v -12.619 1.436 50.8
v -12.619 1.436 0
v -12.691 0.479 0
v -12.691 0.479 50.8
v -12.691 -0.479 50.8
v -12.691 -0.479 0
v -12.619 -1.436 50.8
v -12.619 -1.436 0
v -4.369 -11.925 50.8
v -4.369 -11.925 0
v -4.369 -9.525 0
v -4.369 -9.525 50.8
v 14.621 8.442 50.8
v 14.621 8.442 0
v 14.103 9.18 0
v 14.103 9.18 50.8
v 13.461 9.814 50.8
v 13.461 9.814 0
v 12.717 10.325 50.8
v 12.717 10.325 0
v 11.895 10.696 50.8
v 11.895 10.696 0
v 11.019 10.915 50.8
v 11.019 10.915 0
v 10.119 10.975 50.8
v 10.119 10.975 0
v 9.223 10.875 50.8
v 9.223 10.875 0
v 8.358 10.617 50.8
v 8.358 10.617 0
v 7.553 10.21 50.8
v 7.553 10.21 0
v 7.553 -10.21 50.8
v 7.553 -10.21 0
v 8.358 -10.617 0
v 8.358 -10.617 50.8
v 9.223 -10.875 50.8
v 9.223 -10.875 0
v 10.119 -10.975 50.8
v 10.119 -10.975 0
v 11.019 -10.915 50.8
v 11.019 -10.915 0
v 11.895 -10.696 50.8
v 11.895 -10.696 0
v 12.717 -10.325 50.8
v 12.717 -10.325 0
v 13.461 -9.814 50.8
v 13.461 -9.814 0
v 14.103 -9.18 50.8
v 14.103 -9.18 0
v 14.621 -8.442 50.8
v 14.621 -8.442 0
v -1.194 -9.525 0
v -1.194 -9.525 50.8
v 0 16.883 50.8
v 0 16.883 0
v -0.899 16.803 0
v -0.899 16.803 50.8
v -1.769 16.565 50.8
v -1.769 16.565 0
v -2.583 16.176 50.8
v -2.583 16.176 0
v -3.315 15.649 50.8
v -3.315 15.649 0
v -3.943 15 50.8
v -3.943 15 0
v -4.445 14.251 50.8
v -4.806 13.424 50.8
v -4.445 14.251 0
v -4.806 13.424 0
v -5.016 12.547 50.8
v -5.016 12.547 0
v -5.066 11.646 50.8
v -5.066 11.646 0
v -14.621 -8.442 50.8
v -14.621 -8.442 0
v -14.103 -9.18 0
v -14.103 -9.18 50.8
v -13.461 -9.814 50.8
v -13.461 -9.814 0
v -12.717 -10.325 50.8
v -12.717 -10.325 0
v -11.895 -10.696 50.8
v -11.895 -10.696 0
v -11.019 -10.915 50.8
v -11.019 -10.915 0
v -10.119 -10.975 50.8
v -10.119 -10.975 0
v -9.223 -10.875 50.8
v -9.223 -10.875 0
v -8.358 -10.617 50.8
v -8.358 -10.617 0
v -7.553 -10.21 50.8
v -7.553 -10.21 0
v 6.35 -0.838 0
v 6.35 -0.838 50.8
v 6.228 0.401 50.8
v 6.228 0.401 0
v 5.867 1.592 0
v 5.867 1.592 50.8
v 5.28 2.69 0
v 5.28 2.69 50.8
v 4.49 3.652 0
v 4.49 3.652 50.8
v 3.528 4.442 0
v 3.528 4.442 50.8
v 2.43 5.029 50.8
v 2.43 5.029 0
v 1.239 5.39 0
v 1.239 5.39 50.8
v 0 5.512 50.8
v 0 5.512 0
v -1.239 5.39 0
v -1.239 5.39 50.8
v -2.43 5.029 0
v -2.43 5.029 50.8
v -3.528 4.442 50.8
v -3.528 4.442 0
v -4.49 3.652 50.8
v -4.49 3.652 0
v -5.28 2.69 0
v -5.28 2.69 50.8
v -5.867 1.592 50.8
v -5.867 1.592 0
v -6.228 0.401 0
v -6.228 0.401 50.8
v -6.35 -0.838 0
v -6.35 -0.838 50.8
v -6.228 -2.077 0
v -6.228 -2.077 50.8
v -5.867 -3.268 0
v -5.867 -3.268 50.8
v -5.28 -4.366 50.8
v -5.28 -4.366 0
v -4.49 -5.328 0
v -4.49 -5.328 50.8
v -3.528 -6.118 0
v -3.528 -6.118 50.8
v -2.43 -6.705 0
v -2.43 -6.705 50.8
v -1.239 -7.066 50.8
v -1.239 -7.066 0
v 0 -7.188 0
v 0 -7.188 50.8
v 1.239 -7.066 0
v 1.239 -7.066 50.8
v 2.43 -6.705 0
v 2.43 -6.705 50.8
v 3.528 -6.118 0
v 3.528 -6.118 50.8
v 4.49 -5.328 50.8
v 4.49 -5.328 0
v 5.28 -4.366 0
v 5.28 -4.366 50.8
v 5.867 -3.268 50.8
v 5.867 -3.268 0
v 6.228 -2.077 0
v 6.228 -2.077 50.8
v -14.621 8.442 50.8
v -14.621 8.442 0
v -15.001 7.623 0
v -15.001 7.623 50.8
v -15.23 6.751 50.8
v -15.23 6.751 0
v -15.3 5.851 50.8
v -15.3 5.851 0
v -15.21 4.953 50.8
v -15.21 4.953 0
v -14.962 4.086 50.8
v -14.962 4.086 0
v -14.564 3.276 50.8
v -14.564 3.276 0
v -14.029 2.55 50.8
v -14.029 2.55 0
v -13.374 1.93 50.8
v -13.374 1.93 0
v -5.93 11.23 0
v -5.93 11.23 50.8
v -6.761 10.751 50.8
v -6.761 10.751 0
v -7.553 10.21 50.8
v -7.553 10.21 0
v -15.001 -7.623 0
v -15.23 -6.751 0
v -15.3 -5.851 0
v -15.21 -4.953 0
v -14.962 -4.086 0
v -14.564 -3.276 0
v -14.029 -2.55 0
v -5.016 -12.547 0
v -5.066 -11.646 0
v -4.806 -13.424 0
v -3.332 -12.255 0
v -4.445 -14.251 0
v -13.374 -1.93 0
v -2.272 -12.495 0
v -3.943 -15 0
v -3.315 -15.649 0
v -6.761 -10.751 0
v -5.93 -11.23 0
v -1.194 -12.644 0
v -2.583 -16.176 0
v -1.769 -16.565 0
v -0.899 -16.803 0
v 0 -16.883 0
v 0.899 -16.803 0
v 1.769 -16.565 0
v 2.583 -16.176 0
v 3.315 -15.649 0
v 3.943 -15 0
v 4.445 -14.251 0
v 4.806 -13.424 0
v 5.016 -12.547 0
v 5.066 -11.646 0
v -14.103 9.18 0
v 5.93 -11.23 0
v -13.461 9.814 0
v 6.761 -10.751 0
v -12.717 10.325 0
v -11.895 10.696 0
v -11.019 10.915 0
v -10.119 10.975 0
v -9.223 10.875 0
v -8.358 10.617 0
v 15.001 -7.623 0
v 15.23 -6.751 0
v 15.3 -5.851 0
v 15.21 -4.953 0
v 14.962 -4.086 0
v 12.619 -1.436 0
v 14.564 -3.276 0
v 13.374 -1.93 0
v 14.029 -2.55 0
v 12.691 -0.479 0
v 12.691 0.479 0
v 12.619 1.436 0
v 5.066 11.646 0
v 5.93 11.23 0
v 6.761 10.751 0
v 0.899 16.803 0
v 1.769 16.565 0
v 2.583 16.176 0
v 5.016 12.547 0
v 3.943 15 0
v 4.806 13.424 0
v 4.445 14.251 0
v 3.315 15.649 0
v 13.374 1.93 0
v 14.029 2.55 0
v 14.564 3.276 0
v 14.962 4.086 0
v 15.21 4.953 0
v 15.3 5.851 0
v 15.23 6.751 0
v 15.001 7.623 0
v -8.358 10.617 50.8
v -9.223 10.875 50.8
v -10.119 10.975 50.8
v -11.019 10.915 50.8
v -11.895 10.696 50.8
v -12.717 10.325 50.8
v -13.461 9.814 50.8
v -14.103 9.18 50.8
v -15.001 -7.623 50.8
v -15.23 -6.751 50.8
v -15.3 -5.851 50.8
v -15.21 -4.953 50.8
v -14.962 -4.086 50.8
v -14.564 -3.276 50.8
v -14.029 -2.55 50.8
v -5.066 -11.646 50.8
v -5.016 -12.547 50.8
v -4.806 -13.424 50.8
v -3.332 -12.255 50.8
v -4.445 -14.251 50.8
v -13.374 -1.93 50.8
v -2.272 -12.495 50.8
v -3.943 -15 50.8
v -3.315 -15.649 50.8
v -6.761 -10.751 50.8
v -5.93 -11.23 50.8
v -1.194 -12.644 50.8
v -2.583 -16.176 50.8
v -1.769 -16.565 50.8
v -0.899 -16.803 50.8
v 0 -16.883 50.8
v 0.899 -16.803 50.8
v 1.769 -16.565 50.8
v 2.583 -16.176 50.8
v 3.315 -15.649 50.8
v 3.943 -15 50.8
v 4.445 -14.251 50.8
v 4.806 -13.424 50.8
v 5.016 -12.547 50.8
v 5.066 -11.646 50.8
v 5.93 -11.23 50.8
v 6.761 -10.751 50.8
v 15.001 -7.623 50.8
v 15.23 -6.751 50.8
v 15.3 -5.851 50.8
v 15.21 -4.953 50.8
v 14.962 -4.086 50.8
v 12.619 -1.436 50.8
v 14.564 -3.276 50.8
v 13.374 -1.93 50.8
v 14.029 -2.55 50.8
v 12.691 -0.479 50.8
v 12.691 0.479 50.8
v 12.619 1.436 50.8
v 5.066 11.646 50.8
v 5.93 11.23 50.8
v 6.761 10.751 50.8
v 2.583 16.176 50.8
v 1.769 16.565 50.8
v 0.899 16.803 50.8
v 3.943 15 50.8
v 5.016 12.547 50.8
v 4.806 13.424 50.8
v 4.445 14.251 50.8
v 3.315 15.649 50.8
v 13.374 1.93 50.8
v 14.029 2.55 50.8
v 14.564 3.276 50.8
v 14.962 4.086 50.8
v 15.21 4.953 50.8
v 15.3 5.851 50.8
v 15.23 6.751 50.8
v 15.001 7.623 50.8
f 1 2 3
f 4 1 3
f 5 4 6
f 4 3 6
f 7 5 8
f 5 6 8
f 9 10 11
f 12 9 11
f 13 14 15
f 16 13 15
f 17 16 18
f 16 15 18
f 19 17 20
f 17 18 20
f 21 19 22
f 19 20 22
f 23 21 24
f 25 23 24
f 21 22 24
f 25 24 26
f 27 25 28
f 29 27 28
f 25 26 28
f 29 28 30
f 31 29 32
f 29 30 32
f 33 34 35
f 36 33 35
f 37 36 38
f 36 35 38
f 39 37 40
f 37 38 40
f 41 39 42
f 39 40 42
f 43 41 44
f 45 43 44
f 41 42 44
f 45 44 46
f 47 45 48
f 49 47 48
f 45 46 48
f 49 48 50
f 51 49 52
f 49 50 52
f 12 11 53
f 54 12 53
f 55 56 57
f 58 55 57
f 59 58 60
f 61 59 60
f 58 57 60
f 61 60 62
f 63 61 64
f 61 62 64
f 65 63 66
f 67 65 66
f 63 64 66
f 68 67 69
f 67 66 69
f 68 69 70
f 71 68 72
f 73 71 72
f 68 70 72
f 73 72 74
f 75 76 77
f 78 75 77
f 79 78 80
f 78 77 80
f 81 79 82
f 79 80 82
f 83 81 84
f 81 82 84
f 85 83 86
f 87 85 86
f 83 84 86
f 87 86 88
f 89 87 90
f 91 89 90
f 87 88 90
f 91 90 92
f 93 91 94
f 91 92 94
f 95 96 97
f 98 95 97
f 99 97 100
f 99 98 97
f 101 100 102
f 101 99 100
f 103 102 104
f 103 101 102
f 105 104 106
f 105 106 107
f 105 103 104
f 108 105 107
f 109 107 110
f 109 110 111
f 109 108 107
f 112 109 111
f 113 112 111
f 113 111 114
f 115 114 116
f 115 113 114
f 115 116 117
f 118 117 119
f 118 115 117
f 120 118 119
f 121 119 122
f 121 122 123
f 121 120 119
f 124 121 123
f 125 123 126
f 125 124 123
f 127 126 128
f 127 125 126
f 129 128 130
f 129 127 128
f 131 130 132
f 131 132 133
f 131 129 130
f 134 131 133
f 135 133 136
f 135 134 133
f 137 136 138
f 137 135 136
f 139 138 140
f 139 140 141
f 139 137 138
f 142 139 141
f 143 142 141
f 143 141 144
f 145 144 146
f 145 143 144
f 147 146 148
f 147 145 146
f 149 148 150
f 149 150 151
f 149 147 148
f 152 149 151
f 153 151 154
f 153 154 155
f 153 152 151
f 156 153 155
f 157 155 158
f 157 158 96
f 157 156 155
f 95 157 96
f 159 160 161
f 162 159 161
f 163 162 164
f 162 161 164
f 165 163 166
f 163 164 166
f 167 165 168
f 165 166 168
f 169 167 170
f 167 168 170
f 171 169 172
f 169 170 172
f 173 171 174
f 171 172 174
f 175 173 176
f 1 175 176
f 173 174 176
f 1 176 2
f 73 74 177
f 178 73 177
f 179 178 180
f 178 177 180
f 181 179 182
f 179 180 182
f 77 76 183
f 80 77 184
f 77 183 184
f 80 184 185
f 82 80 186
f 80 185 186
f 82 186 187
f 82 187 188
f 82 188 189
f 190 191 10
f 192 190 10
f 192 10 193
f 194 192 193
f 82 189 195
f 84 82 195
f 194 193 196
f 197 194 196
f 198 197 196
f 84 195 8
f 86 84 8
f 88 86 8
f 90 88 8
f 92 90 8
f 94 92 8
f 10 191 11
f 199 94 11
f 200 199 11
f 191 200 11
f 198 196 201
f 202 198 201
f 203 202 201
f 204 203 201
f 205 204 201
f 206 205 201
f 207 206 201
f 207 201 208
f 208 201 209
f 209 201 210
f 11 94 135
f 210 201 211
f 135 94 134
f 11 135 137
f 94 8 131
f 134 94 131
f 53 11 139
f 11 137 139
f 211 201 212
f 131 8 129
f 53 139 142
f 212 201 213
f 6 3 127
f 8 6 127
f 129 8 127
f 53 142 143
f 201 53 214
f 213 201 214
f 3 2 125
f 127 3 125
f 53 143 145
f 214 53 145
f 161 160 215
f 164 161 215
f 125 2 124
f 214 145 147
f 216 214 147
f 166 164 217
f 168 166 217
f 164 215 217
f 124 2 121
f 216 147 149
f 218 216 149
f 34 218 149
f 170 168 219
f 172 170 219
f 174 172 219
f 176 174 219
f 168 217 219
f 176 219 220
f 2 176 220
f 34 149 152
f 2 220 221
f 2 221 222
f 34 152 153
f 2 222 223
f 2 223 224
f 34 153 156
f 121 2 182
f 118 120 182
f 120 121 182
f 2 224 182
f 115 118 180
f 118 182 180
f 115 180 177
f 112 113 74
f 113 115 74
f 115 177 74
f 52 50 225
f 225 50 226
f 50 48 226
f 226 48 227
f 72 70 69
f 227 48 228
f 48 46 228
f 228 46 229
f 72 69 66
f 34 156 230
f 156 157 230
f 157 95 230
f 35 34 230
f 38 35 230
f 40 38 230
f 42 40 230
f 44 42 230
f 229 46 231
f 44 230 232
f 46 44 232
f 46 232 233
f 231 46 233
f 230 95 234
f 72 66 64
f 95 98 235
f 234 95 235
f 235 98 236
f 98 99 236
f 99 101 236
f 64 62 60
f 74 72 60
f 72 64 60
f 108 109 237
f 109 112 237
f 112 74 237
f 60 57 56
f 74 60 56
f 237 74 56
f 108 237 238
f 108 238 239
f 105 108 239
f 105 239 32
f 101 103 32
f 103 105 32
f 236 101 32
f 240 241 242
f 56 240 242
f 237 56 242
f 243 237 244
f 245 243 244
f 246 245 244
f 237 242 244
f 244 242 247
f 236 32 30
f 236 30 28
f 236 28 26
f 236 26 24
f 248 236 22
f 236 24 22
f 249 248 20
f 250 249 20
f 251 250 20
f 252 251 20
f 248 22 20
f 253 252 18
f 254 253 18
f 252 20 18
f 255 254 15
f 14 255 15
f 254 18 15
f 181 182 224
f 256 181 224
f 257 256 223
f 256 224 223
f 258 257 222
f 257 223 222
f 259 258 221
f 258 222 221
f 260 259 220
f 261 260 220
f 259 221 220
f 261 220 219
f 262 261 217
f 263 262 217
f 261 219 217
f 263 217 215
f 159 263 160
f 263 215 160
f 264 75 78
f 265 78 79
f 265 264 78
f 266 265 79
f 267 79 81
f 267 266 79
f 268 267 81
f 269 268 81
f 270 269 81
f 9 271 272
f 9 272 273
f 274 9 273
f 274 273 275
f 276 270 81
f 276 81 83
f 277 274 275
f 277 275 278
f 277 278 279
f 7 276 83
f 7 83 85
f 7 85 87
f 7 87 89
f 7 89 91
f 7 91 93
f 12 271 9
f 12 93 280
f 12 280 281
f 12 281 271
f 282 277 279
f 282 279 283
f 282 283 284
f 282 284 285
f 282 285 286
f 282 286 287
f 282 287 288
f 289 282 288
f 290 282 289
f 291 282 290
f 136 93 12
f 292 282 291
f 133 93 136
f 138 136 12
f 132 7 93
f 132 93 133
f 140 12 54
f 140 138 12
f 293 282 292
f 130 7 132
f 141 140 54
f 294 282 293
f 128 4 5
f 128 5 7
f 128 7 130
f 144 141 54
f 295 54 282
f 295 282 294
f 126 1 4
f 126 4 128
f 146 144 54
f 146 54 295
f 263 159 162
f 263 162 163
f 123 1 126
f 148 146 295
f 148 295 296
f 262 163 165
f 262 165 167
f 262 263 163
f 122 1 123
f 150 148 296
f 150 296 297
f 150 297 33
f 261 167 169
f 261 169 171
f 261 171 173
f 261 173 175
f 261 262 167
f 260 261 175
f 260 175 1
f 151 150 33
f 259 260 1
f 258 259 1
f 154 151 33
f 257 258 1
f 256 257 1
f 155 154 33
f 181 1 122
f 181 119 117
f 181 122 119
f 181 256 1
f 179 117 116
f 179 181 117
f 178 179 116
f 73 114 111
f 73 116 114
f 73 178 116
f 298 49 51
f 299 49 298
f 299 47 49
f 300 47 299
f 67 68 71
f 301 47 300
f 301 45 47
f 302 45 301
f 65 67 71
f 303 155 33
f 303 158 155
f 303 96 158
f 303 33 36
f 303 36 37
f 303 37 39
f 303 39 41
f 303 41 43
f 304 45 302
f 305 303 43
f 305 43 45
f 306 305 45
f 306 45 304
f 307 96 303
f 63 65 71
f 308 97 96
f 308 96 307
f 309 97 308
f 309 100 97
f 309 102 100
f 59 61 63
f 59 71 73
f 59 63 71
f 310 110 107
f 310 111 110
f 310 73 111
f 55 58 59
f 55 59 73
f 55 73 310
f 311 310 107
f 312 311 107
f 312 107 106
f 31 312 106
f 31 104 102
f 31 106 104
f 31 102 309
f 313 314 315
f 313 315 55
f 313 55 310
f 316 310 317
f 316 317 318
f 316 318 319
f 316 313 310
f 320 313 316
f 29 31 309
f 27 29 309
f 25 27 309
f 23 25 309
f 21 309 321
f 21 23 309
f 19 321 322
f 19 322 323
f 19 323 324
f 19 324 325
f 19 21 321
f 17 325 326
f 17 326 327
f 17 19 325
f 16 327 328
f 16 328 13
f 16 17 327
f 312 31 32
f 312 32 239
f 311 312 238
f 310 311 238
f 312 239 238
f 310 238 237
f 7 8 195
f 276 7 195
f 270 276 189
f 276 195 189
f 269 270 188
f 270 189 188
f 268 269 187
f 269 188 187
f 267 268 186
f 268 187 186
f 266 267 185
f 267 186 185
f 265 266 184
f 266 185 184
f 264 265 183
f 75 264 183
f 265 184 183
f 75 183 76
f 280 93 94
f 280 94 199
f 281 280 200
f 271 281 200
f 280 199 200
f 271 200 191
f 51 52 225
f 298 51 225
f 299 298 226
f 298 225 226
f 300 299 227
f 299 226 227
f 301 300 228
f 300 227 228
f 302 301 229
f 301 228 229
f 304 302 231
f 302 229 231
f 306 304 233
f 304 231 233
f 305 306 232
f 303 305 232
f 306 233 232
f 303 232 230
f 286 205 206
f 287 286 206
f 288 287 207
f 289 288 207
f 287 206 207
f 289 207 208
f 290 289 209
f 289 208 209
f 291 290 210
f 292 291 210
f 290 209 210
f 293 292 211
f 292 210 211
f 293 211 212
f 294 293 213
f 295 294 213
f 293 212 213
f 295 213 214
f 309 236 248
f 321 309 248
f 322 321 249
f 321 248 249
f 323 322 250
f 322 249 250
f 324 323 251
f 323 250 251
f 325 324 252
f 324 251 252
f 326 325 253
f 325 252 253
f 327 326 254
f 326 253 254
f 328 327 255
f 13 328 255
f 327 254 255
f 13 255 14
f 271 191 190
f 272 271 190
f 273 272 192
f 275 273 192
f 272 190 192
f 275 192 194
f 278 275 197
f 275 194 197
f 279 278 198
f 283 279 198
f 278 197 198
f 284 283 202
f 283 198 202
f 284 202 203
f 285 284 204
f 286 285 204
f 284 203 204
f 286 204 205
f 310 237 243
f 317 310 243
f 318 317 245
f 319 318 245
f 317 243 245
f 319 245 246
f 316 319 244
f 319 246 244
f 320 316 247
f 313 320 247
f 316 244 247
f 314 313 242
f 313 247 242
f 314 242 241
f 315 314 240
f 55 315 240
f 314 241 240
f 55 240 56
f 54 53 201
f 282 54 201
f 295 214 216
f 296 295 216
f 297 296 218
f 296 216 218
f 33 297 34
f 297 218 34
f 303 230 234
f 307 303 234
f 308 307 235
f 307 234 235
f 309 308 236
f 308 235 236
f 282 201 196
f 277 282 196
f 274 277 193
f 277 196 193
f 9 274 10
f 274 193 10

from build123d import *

# Parameters (mm, degrees)
F0_R     = 6.35
F1_DEPTH = 50.8


with BuildPart() as f1:
    # F0 (on Top) → F1 (new body)
    with BuildSketch(Plane.XY):
        with BuildLine():
            ThreePointArc((5.065933, 11.645871), (3.643338, 15.338636), (0, 16.883425))
            ThreePointArc((0, 16.883425), (-3.643338, 15.338636), (-5.065933, 11.645871))
            ThreePointArc((-5.065933, 11.645871), (-6.35, 10.998523), (-7.552654, 10.210163))
            ThreePointArc((-7.552654, 10.210163), (-10.998523, 6.35), (-12.618587, 1.435709))
            ThreePointArc((-12.618587, 1.435709), (-12.7, 0), (-12.618587, -1.435709))
            ThreePointArc((-12.618587, -1.435709), (-15.105317, -4.514095), (-14.621475, -8.441712))
            ThreePointArc((-14.621475, -8.441712), (-11.461979, -10.824541), (-7.552654, -10.210163))
            ThreePointArc((-7.552654, -10.210163), (-6.35, -10.998523), (-5.065933, -11.645871))
            ThreePointArc((-5.065933, -11.645871), (-4.719503, -11.790517), (-4.368949, -11.92486))
            Line((-4.368949, -11.92486), (-4.368949, -9.525))
            Line((-4.368949, -9.525), (-1.193949, -9.525))
            Line((-1.193949, -9.525), (-1.193949, -12.643753))
            ThreePointArc((-1.193949, -12.643753), (1.999251, -12.54165), (5.065933, -11.645871))
            ThreePointArc((5.065933, -11.645871), (6.35, -10.998523), (7.552654, -10.210163))
            ThreePointArc((7.552654, -10.210163), (11.461979, -10.824541), (14.621475, -8.441712))
            ThreePointArc((14.621475, -8.441712), (15.105317, -4.514095), (12.618587, -1.435709))
            ThreePointArc((12.618587, -1.435709), (12.7, 0), (12.618587, 1.435709))
            ThreePointArc((12.618587, 1.435709), (10.998523, 6.35), (7.552654, 10.210163))
            ThreePointArc((7.552654, 10.210163), (6.35, 10.998523), (5.065933, 11.645871))
        make_face()
        with Locations((0, -0.838046)):
            Circle(F0_R, mode=Mode.SUBTRACT)
        with BuildLine():
            ThreePointArc((-12.618587, 1.435709), (-10.998523, 6.35), (-7.552654, 10.210163))
            ThreePointArc((-7.552654, 10.210163), (-11.461979, 10.824541), (-14.621475, 8.441712))
            ThreePointArc((-14.621475, 8.441712), (-15.105317, 4.514095), (-12.618587, 1.435709))
        make_face()
        with BuildLine():
            ThreePointArc((14.621475, 8.441712), (11.461979, 10.824541), (7.552654, 10.210163))
            ThreePointArc((7.552654, 10.210163), (10.998523, 6.35), (12.618587, 1.435709))
            ThreePointArc((12.618587, 1.435709), (15.105317, 4.514095), (14.621475, 8.441712))
        make_face()
        with BuildLine():
            ThreePointArc((-4.368949, -11.92486), (-4.719503, -11.790517), (-5.065933, -11.645871))
            ThreePointArc((-5.065933, -11.645871), (-3.643338, -15.338636), (0, -16.883425))
            ThreePointArc((0, -16.883425), (3.643338, -15.338636), (5.065933, -11.645871))
            ThreePointArc((5.065933, -11.645871), (1.999251, -12.54165), (-1.193949, -12.643753))
            ThreePointArc((-1.193949, -12.643753), (-2.804579, -12.386458), (-4.368949, -11.92486))
        make_face()
    extrude(amount=F1_DEPTH)


solid = f1.part
